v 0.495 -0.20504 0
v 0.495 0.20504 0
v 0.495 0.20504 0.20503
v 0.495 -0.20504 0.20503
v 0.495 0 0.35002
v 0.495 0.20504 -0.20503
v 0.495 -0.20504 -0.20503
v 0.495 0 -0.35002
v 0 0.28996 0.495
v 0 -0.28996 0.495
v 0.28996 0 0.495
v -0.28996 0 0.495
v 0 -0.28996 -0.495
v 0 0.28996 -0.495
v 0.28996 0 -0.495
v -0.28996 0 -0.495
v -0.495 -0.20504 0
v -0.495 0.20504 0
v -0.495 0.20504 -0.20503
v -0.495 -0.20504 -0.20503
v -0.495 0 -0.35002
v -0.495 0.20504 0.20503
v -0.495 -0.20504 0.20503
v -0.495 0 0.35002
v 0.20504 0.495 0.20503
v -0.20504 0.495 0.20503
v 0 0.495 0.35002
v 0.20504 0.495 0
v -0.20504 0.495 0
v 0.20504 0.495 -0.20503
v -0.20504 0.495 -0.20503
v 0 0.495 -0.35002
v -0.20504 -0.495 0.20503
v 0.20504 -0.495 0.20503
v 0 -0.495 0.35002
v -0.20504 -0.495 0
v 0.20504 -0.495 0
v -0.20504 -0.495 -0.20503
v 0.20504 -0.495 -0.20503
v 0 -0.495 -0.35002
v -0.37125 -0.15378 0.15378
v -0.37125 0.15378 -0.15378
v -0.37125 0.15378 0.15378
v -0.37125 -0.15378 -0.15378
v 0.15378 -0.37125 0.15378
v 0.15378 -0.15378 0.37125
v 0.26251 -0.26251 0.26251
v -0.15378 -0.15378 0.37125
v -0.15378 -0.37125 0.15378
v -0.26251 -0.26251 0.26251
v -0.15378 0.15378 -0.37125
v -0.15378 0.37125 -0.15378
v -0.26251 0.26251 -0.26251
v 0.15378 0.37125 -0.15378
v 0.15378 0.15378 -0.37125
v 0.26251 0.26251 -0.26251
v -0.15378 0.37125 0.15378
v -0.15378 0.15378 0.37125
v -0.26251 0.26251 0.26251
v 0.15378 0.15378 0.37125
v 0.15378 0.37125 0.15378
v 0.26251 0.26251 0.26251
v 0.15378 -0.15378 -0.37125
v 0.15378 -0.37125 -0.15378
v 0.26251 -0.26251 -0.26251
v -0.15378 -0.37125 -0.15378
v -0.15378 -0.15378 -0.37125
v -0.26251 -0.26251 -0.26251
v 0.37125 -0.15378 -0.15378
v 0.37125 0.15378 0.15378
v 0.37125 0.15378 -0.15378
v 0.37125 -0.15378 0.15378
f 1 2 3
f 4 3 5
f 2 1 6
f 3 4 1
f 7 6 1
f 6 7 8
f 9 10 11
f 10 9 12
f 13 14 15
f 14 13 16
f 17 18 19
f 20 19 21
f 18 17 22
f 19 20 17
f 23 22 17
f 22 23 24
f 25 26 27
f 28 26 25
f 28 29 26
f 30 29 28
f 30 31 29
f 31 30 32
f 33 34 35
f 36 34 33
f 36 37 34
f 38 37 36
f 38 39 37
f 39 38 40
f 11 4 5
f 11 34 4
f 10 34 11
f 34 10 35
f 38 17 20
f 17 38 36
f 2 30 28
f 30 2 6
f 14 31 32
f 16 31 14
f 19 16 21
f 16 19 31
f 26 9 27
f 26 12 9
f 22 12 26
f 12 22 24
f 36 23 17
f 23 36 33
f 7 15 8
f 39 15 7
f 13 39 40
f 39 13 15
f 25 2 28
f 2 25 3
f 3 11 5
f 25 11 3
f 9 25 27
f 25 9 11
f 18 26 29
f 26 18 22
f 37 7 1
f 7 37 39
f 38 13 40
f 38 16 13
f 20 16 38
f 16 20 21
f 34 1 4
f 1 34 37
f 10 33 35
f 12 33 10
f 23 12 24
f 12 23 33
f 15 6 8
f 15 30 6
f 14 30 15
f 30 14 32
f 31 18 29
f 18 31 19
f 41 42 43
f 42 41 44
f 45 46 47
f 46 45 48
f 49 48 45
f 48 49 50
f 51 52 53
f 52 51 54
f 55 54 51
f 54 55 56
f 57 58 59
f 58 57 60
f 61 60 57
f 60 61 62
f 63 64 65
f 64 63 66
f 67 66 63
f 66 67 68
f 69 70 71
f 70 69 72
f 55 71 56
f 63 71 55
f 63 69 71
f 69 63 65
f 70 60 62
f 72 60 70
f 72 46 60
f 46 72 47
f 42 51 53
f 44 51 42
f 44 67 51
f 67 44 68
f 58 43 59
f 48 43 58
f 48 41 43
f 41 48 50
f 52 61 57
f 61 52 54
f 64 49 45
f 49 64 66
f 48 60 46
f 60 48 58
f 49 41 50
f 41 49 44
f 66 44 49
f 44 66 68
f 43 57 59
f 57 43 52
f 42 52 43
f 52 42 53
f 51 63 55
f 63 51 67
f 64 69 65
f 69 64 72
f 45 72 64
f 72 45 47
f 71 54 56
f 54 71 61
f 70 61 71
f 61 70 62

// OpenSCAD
$fn=16;
s=.99;

difference() {
    intersection() {
        cube([s,s,s],center=true);
        rotate([45,0,45])
        cube([s,s,s],center=true);
        rotate([0,45,45])
        cube([s,s,s],center=true);
    }
    intersection() {
        t=s*3/4;
        rotate([45,0,0])
        cube([t,t,t],center=true);
        rotate([0,45,0])
        cube([t,t,t],center=true);
        rotate([0,0,45])
        cube([t,t,t],center=true);
    }
}
